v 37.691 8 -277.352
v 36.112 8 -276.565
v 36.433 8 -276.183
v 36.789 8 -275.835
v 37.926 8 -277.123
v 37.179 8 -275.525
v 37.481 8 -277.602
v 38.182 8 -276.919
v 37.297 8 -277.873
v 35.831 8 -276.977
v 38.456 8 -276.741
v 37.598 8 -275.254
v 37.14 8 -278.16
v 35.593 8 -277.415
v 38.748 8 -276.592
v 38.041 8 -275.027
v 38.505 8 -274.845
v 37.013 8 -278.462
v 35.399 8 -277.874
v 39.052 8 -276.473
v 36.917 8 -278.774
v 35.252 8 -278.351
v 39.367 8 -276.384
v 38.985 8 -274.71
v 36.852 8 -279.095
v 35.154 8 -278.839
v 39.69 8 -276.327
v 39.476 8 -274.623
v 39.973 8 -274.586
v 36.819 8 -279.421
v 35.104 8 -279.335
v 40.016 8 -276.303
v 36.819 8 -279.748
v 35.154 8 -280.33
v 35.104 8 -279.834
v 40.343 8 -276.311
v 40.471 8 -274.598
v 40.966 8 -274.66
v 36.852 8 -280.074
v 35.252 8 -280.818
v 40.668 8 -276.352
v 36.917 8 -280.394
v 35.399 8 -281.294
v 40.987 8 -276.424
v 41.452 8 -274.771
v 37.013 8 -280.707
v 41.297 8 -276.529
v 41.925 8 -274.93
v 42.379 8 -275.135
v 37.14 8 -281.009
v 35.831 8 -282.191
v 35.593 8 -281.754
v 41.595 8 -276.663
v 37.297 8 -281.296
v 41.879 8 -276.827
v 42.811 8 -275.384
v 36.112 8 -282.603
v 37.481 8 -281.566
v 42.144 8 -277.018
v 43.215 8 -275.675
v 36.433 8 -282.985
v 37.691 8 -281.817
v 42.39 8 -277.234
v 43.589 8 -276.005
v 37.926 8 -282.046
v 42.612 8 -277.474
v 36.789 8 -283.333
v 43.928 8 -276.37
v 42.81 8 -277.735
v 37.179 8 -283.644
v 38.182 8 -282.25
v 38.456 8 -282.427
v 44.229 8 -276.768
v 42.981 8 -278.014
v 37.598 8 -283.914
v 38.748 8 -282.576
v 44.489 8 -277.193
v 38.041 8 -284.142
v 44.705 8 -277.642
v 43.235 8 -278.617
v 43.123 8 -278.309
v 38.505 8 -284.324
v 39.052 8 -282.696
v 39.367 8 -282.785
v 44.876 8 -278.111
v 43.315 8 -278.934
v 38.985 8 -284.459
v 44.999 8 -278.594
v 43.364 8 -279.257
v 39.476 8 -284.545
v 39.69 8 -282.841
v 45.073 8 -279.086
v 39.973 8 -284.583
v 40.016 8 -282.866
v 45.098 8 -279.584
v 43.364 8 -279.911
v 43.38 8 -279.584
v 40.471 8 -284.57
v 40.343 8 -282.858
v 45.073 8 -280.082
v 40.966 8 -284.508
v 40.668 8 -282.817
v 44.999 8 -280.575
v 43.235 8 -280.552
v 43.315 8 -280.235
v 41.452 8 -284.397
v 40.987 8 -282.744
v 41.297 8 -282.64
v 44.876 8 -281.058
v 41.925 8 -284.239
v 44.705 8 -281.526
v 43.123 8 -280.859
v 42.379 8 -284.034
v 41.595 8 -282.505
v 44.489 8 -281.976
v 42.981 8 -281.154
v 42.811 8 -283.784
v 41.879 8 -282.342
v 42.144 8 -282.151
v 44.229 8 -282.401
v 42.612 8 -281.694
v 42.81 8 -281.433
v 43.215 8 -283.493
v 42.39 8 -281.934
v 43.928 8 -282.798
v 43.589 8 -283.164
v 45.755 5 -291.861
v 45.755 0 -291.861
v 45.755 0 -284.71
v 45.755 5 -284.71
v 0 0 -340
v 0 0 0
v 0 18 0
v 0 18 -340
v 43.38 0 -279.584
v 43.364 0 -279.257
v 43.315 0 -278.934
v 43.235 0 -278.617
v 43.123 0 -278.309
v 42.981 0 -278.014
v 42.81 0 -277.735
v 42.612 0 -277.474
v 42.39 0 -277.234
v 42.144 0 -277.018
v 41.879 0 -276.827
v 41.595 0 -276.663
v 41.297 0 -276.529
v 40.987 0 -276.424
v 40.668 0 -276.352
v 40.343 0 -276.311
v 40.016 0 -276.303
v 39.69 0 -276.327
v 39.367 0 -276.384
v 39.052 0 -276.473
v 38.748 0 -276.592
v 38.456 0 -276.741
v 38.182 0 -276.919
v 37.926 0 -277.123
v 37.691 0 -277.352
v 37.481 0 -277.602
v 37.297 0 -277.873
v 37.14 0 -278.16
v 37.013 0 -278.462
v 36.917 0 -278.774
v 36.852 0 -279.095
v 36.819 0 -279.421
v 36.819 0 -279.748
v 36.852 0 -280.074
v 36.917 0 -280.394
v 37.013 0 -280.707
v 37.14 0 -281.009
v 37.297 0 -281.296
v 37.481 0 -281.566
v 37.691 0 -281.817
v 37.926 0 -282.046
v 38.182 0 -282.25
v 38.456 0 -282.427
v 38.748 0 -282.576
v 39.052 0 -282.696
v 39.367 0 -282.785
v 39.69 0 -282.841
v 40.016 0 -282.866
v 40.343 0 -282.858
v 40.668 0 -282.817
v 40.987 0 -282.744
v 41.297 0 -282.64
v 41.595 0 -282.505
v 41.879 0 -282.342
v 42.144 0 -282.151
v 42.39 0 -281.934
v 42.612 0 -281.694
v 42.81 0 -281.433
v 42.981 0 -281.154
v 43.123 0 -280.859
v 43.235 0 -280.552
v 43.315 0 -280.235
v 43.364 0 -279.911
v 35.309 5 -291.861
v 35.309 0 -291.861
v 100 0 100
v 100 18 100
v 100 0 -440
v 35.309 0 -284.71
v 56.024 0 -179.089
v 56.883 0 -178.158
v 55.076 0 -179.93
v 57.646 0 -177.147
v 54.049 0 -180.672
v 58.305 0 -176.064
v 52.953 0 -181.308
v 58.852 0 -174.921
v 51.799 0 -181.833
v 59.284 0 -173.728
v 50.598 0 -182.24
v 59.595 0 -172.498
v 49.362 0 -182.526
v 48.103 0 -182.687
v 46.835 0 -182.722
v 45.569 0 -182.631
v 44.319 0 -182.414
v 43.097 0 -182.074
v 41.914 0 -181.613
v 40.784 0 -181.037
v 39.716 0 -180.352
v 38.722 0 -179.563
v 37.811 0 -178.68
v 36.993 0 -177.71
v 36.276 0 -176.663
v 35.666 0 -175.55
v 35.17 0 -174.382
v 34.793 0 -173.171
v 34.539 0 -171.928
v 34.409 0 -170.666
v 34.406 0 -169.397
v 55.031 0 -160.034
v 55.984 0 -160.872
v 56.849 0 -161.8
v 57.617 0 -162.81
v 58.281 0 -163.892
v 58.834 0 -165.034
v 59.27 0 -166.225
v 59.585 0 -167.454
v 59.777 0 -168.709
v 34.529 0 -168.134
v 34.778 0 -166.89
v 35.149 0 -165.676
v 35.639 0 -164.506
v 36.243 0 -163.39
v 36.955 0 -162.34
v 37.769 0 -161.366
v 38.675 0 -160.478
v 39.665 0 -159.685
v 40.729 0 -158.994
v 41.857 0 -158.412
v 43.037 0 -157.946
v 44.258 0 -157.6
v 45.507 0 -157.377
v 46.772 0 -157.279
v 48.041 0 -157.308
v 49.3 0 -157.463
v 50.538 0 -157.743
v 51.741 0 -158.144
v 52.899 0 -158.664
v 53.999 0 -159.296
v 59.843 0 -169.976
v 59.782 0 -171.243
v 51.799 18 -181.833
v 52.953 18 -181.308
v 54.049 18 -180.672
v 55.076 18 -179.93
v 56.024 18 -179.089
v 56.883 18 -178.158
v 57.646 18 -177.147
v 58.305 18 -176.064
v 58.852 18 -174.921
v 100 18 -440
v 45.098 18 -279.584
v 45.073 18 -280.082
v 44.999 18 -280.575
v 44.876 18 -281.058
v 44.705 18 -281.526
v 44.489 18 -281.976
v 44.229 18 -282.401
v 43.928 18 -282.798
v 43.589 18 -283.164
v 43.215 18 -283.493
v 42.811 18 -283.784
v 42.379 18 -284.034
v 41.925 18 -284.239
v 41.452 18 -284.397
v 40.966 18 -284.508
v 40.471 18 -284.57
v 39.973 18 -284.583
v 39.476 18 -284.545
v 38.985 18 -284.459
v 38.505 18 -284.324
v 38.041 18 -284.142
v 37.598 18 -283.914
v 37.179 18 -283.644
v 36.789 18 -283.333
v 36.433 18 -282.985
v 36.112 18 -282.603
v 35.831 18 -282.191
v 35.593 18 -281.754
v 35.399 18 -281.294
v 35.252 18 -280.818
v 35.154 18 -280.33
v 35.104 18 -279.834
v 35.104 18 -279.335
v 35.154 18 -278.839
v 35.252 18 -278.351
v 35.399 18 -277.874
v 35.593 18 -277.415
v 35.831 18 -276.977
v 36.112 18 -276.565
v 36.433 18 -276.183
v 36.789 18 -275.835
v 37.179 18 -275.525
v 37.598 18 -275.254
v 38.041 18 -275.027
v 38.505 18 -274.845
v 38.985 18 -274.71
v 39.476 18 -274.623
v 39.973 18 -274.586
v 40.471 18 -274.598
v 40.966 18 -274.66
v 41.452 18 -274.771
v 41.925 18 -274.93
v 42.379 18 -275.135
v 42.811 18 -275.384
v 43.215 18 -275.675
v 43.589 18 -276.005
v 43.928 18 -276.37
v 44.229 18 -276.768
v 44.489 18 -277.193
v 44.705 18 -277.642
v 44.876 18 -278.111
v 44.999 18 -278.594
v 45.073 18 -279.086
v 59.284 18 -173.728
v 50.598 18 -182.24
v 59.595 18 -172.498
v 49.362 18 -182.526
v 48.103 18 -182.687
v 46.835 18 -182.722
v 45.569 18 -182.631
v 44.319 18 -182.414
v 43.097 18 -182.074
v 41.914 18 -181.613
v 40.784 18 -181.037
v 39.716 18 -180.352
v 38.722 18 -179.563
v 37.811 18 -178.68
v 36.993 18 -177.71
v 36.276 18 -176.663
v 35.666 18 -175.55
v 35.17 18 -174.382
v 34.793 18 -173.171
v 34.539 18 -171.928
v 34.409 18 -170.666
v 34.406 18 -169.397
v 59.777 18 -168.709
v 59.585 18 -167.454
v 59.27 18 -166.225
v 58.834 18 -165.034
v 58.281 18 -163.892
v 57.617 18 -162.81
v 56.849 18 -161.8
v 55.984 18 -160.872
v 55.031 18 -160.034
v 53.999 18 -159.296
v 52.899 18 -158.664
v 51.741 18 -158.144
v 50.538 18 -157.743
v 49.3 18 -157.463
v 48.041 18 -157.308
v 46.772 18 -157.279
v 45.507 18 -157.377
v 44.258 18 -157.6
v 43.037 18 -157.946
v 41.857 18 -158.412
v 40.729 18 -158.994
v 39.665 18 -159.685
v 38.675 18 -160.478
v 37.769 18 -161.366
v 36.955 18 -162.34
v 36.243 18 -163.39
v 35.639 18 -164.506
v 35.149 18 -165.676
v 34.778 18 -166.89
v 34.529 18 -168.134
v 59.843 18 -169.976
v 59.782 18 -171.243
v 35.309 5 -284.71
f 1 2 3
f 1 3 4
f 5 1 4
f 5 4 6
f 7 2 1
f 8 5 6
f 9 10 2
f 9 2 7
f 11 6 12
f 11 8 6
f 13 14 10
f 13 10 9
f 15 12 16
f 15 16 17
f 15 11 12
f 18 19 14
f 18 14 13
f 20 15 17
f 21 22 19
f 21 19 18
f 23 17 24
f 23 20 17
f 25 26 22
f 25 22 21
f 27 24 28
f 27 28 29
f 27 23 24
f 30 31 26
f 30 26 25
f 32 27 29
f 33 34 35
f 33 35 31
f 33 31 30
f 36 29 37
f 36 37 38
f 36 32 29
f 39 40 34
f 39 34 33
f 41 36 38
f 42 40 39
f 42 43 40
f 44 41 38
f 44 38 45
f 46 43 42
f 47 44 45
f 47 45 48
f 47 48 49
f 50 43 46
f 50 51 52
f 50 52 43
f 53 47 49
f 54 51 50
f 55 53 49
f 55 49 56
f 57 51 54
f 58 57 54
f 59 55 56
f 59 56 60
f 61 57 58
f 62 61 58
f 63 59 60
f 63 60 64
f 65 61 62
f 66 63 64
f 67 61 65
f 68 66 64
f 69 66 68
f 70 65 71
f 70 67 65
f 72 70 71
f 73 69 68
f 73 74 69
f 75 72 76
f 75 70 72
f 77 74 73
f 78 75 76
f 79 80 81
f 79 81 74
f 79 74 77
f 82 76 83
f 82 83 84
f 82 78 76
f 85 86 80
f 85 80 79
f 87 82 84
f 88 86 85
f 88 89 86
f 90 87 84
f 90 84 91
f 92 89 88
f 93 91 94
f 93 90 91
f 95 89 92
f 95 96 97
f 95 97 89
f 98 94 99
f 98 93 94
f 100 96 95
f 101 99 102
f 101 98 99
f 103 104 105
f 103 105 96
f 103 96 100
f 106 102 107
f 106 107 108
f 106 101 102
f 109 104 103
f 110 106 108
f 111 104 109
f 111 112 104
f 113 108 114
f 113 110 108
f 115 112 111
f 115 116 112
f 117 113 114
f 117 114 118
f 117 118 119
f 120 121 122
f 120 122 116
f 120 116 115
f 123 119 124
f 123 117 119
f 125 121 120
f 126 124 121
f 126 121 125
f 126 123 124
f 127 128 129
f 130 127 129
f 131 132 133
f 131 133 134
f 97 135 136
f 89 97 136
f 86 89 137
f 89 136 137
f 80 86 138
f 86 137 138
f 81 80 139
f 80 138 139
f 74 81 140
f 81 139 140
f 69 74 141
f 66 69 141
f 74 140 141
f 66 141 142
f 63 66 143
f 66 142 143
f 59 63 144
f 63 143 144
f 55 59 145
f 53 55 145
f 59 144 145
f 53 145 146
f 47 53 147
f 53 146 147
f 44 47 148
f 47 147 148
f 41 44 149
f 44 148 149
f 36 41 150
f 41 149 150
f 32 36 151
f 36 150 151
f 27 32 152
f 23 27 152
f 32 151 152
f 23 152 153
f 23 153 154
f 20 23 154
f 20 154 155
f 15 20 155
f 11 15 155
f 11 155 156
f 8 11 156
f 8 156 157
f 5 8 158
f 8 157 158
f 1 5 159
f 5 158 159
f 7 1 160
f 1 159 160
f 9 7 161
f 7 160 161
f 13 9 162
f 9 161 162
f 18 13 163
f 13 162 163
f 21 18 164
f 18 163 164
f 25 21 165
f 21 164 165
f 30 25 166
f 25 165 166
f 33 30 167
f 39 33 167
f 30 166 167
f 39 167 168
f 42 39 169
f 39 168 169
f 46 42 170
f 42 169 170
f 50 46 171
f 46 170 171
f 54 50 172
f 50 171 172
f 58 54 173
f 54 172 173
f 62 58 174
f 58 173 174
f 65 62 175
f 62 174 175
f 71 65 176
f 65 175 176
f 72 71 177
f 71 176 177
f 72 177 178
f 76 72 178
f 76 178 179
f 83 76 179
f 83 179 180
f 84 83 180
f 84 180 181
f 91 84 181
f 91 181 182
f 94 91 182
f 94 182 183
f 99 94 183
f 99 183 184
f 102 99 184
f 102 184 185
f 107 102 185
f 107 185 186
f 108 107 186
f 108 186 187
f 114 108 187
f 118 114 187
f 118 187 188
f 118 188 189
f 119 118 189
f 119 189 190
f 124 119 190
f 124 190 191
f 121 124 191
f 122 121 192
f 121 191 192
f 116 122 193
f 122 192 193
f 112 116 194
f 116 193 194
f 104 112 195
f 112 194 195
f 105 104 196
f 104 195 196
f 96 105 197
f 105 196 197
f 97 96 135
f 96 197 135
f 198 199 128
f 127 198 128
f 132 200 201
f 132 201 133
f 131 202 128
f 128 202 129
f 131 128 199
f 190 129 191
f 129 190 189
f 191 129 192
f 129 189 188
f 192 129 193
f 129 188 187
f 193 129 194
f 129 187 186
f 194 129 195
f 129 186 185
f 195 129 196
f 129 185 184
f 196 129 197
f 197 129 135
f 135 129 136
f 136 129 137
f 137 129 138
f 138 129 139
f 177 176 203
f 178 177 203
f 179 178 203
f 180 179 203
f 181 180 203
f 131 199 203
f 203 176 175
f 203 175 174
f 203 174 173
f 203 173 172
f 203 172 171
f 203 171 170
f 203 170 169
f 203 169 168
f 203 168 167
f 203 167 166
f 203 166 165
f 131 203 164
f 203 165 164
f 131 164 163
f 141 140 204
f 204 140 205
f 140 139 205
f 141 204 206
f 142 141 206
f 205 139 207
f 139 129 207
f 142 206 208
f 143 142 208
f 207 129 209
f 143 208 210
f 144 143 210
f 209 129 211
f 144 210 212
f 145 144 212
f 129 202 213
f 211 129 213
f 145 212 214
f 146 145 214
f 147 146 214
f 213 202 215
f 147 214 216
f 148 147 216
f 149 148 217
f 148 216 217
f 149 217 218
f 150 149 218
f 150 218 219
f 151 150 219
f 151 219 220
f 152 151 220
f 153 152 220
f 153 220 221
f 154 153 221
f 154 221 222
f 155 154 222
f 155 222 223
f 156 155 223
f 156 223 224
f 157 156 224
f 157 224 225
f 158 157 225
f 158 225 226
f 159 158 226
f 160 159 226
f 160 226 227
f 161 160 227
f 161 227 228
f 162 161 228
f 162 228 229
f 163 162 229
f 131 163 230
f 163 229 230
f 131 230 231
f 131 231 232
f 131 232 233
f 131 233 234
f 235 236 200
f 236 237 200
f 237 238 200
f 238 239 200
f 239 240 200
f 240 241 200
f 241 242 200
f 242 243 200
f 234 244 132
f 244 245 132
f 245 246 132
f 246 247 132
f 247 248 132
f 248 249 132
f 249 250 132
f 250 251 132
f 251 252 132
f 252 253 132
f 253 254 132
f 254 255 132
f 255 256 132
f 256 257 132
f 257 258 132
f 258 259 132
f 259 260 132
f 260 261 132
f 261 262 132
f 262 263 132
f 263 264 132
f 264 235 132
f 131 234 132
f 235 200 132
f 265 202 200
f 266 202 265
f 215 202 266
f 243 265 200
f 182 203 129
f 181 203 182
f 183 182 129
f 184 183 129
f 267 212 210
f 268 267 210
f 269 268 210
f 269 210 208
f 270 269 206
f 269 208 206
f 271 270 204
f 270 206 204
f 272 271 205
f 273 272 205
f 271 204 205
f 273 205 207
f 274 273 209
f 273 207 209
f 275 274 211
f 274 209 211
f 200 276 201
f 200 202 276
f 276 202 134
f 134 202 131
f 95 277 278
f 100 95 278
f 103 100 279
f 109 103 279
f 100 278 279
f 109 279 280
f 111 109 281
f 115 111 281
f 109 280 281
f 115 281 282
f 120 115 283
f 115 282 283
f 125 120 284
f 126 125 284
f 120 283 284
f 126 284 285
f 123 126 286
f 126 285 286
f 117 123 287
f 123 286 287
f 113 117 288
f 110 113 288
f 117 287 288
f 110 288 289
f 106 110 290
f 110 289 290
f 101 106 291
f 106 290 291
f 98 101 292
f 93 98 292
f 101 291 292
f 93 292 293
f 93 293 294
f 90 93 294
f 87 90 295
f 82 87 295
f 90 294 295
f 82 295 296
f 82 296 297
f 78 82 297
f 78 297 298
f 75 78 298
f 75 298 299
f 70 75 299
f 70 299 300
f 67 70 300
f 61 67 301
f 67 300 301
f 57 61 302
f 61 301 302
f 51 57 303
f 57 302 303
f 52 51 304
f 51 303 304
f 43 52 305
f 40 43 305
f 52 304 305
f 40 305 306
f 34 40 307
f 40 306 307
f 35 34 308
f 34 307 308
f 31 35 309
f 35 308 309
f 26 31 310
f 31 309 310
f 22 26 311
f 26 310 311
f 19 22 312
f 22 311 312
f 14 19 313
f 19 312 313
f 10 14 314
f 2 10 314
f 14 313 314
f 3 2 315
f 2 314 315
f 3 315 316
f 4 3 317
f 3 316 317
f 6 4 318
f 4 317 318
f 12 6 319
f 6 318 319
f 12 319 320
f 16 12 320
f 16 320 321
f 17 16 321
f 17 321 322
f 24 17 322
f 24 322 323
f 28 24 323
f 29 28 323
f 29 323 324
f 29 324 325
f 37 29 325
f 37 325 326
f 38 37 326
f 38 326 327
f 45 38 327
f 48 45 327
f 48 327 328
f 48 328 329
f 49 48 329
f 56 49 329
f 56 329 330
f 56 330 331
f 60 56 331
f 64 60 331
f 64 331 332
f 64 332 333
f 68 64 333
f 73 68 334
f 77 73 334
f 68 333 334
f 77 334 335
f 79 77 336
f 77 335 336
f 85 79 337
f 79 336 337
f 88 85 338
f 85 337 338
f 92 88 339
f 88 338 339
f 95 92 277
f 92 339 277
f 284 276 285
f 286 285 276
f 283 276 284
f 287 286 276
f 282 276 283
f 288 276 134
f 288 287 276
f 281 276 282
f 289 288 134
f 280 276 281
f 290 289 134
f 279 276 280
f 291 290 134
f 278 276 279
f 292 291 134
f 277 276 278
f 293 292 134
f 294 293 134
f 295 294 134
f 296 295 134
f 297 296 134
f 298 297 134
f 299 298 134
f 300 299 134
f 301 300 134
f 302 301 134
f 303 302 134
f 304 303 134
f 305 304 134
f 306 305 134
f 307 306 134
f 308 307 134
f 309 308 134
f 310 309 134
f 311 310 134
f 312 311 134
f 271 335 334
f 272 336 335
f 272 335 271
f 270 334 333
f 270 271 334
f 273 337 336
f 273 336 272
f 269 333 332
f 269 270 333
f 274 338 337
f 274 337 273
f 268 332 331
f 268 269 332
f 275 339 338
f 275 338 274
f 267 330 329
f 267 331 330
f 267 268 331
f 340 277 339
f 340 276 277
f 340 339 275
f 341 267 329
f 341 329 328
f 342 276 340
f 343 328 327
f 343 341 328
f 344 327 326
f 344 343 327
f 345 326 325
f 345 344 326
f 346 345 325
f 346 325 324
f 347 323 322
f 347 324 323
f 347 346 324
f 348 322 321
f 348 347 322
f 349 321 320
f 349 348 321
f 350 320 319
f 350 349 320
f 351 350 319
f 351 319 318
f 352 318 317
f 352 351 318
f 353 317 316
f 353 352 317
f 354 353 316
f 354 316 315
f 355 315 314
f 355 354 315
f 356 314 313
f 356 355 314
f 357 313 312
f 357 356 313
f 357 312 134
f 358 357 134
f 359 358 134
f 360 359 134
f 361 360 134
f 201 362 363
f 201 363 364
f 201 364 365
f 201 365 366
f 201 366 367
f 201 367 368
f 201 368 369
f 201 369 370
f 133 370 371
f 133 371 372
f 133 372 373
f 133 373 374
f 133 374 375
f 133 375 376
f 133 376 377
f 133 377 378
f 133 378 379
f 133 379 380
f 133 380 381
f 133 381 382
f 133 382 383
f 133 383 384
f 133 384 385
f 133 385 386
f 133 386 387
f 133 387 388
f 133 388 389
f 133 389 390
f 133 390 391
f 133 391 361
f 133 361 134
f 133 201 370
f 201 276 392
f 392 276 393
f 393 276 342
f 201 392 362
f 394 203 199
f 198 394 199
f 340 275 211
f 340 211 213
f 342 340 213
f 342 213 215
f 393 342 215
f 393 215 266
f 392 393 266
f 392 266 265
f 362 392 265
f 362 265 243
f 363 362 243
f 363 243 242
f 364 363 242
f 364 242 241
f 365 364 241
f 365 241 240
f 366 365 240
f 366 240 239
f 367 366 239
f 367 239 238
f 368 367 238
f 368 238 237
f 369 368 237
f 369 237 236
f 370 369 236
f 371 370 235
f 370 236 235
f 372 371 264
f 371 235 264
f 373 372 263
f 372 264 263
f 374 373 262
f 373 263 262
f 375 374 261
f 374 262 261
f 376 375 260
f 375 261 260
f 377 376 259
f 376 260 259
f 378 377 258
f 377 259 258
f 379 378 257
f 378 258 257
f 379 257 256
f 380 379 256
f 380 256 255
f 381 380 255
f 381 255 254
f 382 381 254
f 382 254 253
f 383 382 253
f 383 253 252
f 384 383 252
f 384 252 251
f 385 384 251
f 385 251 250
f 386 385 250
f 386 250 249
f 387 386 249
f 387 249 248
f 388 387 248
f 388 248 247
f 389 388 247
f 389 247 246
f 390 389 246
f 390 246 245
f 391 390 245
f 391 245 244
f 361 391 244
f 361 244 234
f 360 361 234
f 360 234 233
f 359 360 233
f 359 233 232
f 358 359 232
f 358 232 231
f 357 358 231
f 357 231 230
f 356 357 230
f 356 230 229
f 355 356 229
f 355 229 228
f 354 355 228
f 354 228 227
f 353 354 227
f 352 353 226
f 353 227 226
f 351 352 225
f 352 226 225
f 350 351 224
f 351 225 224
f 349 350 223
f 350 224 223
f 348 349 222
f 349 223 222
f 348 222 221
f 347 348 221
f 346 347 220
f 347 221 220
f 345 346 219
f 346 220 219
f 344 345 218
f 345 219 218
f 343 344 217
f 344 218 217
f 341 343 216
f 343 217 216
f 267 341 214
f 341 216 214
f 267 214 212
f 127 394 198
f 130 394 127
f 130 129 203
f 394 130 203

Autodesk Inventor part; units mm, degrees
ref_plane "YZ Plane" through (0, 0, 0) normal (1, 0, 0) x (0, 1, 0)
ref_plane "XZ Plane" through (0, 0, 0) normal (0, 1, 0) x (-1, 0, 0)
ref_plane "XY Plane" through (0, 0, 0) normal (0, 0, 1) x (1, 0, 0)
sketch "Sketch1" plane through (0, 0, 0) normal (0, 1, 0) x (-1, 0, 0)
  line L0 (0, 0) -> (0, -340)
  line L1 (0, 0) -> (-100, 0)
  line L2 (-100, 0) -> (-100, 100)
  line L3 (-100, 100) -> (0, 0)
  line L4 (0, -340) -> (-100, -340)
  line L5 (-100, -340) -> (-100, -440)
  line L6 (-100, -440) -> (0, -340)
  line L7 (-100, -340) -> (-100, 0)
  dimension "d0" = 340
  dimension "d1" = 100
  dimension "d2" = 100
  dimension "d3" = 100
  dimension "d4" = 100
extrude "Extrusion1" add sketch "Sketch1" along normal blind 18
sketch "Sketch2" plane through (0, 0, 0) normal (0, -1, 0) x (1, 0, 0)
  line L0 (70, -367.7995) -> (70, -407.7995)
  line L1 (25, 17.2005) -> (25, -362.7995)
  arc A0 (51.7994, -181.8328) -> (58.8525, -174.9214) centre (47.1172, -170) ccw
  circle A1 centre (47.1172, -170) radius 12.7255
  line L2 (0, -340) -> (100, -440)
  line L3 (100, 100) -> (0, 0)
  line L4 (100, -440) -> (100, 100)
  line L5 (0, 0) -> (0, -340)
  line L6 (100, 100) -> (100, -440) projected
  line L7 (100, -170) -> (0, -170)
  point P0 (30, 22.2005)
extrude "Extrusion2" cut sketch "Sketch2" against normal blind 20 contours A1 L7 A0 | A1 L7
sketch "Sketch4" plane through (0, 18, 0) normal (0, 1, 0) x (1, 0, 0)
  circle A0 centre (40.0978, 279.5843) radius 3.2826
  line L0 (35.3115, 284.709) -> (45.7543, 284.709)
  line L1 (45.7543, 284.709) -> (45.7543, 291.8643)
  line L2 (45.7543, 291.8643) -> (35.3115, 291.8643)
  line L3 (35.3115, 291.8643) -> (35.3115, 284.709)
  line L4 (0, 340) -> (0, 0)
  line L5 (0, 340) -> (100, 440)
  line L6 (100, -100) -> (100, 440)
  line L7 (100, -100) -> (0, 0)
  dimension "d24" = 6.5652
extrude "Extrusion4" cut sketch "Sketch4" against normal blind 10 contours A0
sketch "Sketch6" plane through (0, 0, 0) normal (0, -1, 0) x (1, 0, 0)
  circle A0 centre (40.0978, -279.5843) radius 3.2826 projected
  circle A1 centre (40.0978, -279.5843) radius 3.2826 projected
  circle A2 centre (40.0978, -279.5843) radius 5
  point P0 (0, 0)
  dimension "d14" = 10
sketch "Sketch7" plane through (0, 18, 0) normal (0, 1, 0) x (1, 0, 0)
  circle A0 centre (40.0978, 279.5843) radius 3.2826
  line L0 (35.3115, 284.709) -> (45.7543, 284.709)
  line L1 (45.7543, 284.709) -> (45.7543, 291.8643)
  line L2 (45.7543, 291.8643) -> (35.3115, 291.8643)
  line L3 (35.3115, 291.8643) -> (35.3115, 284.709)
  line L4 (0, 340) -> (0, 0)
  line L5 (0, 340) -> (100, 440)
  line L6 (100, -100) -> (100, 440)
  line L7 (100, -100) -> (0, 0)
  circle A1 centre (40.0978, 279.5843) radius 5
  dimension "d19" = 10
extrude "Extrusion7" cut sketch "Sketch7" against normal blind 10 contours A0 | A1
extrude "Extrusion8" cut sketch "Sketch6" against normal blind 18 contours A0
sketch "Sketch9" plane through (0, 0, 0) normal (0, -1, 0) x (1, 0, 0)
  circle A0 centre (40.0978, -279.5843) radius 3.2826 projected
  circle A1 centre (47.1172, -170) radius 12.7255 projected
  line L0 (0, 0) -> (100, 100) projected
  line L1 (0, -340) -> (0, 0) projected
  line L2 (100, -440) -> (0, -340) projected
  line L3 (100, 100) -> (100, -440) projected
  line L4 (35.3092, -291.8611) -> (45.7546, -291.8611)
  line L5 (45.7546, -291.8611) -> (45.7546, -284.7095)
  line L6 (45.7546, -284.7095) -> (35.3092, -284.7095)
  line L7 (35.3092, -284.7095) -> (35.3092, -291.8611)
extrude "Extrusion9" cut sketch "Sketch9" against normal blind 5 contours L7 L6 L5 L4
properties part number "Fata_2"
